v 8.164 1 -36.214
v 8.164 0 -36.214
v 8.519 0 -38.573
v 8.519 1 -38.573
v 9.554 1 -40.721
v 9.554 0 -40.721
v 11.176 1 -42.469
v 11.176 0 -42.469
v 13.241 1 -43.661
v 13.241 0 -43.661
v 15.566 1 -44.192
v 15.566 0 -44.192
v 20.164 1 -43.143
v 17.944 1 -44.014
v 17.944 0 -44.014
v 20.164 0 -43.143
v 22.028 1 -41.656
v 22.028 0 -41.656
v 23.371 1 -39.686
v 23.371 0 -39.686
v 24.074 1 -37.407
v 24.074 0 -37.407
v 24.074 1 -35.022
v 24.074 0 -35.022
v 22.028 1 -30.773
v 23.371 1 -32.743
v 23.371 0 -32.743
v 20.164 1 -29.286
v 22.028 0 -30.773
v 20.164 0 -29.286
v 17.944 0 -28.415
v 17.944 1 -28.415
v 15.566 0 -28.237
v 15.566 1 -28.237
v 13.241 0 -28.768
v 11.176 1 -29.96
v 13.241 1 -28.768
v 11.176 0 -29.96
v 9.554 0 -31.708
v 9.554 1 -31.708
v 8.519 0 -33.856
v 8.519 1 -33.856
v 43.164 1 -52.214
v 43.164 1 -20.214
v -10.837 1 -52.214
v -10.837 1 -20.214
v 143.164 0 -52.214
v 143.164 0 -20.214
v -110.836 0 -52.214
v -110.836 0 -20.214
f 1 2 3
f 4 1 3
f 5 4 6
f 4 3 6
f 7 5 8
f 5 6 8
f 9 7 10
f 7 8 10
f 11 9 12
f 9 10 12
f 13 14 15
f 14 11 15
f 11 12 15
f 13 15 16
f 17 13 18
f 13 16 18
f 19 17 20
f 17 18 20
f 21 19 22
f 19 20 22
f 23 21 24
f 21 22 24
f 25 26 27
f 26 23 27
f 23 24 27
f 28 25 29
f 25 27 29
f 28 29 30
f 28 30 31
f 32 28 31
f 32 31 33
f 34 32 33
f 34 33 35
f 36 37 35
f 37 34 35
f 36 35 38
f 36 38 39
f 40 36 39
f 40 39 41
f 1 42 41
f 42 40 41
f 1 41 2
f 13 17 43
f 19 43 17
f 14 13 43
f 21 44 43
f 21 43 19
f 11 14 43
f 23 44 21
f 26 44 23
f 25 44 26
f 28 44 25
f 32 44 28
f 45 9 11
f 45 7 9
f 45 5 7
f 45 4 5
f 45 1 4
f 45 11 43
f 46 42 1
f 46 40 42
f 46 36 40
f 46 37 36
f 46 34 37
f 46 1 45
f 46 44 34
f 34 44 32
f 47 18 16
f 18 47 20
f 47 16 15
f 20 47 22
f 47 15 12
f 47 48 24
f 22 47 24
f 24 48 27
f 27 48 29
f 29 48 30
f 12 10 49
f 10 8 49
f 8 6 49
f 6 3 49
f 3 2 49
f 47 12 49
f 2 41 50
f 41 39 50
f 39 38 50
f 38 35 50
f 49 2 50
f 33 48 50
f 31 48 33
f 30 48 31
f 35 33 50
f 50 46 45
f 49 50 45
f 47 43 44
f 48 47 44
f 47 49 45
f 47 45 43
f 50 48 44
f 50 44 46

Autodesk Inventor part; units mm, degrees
ref_plane "YZ Plane" through (0, 0, 0) normal (1, 0, 0) x (0, 1, 0)
ref_plane "XZ Plane" through (0, 0, 0) normal (0, 1, 0) x (-1, 0, 0)
ref_plane "XY Plane" through (0, 0, 0) normal (0, 0, 1) x (1, 0, 0)
sketch "Sketch1" plane through (0, 0, 0) normal (0, 1, 0) x (-1, 0, 0)
  line L0 (-143.1635, -20.2145) -> (110.8365, -20.2145)
  line L1 (110.8365, -20.2145) -> (110.8365, -52.2145)
  line L2 (110.8365, -52.2145) -> (-143.1635, -52.2145)
  line L3 (-143.1635, -52.2145) -> (-143.1635, -20.2145)
  circle A0 centre (-16.1635, -36.2145) radius 8
  point P0 (0, 0)
  dimension "d0" = 254
  dimension "d1" = 32
  dimension "d10" = 16
  dimension "d11" = 127
  dimension "d12" = 16
extrude "Extrusion1" add sketch "Sketch1" along normal blind 1
chamfer "Chamfer1" distance 100 distance2 1 1 edges at (143.1635, 1, -36.2145) measured on face at (103.4969, 1, -36.2145)
chamfer "Chamfer2" distance 100 distance2 1 1 edges at (-110.8365, 1, -36.2145) measured on face at (-71.1698, 1, -36.2145)
properties part number "lama"
